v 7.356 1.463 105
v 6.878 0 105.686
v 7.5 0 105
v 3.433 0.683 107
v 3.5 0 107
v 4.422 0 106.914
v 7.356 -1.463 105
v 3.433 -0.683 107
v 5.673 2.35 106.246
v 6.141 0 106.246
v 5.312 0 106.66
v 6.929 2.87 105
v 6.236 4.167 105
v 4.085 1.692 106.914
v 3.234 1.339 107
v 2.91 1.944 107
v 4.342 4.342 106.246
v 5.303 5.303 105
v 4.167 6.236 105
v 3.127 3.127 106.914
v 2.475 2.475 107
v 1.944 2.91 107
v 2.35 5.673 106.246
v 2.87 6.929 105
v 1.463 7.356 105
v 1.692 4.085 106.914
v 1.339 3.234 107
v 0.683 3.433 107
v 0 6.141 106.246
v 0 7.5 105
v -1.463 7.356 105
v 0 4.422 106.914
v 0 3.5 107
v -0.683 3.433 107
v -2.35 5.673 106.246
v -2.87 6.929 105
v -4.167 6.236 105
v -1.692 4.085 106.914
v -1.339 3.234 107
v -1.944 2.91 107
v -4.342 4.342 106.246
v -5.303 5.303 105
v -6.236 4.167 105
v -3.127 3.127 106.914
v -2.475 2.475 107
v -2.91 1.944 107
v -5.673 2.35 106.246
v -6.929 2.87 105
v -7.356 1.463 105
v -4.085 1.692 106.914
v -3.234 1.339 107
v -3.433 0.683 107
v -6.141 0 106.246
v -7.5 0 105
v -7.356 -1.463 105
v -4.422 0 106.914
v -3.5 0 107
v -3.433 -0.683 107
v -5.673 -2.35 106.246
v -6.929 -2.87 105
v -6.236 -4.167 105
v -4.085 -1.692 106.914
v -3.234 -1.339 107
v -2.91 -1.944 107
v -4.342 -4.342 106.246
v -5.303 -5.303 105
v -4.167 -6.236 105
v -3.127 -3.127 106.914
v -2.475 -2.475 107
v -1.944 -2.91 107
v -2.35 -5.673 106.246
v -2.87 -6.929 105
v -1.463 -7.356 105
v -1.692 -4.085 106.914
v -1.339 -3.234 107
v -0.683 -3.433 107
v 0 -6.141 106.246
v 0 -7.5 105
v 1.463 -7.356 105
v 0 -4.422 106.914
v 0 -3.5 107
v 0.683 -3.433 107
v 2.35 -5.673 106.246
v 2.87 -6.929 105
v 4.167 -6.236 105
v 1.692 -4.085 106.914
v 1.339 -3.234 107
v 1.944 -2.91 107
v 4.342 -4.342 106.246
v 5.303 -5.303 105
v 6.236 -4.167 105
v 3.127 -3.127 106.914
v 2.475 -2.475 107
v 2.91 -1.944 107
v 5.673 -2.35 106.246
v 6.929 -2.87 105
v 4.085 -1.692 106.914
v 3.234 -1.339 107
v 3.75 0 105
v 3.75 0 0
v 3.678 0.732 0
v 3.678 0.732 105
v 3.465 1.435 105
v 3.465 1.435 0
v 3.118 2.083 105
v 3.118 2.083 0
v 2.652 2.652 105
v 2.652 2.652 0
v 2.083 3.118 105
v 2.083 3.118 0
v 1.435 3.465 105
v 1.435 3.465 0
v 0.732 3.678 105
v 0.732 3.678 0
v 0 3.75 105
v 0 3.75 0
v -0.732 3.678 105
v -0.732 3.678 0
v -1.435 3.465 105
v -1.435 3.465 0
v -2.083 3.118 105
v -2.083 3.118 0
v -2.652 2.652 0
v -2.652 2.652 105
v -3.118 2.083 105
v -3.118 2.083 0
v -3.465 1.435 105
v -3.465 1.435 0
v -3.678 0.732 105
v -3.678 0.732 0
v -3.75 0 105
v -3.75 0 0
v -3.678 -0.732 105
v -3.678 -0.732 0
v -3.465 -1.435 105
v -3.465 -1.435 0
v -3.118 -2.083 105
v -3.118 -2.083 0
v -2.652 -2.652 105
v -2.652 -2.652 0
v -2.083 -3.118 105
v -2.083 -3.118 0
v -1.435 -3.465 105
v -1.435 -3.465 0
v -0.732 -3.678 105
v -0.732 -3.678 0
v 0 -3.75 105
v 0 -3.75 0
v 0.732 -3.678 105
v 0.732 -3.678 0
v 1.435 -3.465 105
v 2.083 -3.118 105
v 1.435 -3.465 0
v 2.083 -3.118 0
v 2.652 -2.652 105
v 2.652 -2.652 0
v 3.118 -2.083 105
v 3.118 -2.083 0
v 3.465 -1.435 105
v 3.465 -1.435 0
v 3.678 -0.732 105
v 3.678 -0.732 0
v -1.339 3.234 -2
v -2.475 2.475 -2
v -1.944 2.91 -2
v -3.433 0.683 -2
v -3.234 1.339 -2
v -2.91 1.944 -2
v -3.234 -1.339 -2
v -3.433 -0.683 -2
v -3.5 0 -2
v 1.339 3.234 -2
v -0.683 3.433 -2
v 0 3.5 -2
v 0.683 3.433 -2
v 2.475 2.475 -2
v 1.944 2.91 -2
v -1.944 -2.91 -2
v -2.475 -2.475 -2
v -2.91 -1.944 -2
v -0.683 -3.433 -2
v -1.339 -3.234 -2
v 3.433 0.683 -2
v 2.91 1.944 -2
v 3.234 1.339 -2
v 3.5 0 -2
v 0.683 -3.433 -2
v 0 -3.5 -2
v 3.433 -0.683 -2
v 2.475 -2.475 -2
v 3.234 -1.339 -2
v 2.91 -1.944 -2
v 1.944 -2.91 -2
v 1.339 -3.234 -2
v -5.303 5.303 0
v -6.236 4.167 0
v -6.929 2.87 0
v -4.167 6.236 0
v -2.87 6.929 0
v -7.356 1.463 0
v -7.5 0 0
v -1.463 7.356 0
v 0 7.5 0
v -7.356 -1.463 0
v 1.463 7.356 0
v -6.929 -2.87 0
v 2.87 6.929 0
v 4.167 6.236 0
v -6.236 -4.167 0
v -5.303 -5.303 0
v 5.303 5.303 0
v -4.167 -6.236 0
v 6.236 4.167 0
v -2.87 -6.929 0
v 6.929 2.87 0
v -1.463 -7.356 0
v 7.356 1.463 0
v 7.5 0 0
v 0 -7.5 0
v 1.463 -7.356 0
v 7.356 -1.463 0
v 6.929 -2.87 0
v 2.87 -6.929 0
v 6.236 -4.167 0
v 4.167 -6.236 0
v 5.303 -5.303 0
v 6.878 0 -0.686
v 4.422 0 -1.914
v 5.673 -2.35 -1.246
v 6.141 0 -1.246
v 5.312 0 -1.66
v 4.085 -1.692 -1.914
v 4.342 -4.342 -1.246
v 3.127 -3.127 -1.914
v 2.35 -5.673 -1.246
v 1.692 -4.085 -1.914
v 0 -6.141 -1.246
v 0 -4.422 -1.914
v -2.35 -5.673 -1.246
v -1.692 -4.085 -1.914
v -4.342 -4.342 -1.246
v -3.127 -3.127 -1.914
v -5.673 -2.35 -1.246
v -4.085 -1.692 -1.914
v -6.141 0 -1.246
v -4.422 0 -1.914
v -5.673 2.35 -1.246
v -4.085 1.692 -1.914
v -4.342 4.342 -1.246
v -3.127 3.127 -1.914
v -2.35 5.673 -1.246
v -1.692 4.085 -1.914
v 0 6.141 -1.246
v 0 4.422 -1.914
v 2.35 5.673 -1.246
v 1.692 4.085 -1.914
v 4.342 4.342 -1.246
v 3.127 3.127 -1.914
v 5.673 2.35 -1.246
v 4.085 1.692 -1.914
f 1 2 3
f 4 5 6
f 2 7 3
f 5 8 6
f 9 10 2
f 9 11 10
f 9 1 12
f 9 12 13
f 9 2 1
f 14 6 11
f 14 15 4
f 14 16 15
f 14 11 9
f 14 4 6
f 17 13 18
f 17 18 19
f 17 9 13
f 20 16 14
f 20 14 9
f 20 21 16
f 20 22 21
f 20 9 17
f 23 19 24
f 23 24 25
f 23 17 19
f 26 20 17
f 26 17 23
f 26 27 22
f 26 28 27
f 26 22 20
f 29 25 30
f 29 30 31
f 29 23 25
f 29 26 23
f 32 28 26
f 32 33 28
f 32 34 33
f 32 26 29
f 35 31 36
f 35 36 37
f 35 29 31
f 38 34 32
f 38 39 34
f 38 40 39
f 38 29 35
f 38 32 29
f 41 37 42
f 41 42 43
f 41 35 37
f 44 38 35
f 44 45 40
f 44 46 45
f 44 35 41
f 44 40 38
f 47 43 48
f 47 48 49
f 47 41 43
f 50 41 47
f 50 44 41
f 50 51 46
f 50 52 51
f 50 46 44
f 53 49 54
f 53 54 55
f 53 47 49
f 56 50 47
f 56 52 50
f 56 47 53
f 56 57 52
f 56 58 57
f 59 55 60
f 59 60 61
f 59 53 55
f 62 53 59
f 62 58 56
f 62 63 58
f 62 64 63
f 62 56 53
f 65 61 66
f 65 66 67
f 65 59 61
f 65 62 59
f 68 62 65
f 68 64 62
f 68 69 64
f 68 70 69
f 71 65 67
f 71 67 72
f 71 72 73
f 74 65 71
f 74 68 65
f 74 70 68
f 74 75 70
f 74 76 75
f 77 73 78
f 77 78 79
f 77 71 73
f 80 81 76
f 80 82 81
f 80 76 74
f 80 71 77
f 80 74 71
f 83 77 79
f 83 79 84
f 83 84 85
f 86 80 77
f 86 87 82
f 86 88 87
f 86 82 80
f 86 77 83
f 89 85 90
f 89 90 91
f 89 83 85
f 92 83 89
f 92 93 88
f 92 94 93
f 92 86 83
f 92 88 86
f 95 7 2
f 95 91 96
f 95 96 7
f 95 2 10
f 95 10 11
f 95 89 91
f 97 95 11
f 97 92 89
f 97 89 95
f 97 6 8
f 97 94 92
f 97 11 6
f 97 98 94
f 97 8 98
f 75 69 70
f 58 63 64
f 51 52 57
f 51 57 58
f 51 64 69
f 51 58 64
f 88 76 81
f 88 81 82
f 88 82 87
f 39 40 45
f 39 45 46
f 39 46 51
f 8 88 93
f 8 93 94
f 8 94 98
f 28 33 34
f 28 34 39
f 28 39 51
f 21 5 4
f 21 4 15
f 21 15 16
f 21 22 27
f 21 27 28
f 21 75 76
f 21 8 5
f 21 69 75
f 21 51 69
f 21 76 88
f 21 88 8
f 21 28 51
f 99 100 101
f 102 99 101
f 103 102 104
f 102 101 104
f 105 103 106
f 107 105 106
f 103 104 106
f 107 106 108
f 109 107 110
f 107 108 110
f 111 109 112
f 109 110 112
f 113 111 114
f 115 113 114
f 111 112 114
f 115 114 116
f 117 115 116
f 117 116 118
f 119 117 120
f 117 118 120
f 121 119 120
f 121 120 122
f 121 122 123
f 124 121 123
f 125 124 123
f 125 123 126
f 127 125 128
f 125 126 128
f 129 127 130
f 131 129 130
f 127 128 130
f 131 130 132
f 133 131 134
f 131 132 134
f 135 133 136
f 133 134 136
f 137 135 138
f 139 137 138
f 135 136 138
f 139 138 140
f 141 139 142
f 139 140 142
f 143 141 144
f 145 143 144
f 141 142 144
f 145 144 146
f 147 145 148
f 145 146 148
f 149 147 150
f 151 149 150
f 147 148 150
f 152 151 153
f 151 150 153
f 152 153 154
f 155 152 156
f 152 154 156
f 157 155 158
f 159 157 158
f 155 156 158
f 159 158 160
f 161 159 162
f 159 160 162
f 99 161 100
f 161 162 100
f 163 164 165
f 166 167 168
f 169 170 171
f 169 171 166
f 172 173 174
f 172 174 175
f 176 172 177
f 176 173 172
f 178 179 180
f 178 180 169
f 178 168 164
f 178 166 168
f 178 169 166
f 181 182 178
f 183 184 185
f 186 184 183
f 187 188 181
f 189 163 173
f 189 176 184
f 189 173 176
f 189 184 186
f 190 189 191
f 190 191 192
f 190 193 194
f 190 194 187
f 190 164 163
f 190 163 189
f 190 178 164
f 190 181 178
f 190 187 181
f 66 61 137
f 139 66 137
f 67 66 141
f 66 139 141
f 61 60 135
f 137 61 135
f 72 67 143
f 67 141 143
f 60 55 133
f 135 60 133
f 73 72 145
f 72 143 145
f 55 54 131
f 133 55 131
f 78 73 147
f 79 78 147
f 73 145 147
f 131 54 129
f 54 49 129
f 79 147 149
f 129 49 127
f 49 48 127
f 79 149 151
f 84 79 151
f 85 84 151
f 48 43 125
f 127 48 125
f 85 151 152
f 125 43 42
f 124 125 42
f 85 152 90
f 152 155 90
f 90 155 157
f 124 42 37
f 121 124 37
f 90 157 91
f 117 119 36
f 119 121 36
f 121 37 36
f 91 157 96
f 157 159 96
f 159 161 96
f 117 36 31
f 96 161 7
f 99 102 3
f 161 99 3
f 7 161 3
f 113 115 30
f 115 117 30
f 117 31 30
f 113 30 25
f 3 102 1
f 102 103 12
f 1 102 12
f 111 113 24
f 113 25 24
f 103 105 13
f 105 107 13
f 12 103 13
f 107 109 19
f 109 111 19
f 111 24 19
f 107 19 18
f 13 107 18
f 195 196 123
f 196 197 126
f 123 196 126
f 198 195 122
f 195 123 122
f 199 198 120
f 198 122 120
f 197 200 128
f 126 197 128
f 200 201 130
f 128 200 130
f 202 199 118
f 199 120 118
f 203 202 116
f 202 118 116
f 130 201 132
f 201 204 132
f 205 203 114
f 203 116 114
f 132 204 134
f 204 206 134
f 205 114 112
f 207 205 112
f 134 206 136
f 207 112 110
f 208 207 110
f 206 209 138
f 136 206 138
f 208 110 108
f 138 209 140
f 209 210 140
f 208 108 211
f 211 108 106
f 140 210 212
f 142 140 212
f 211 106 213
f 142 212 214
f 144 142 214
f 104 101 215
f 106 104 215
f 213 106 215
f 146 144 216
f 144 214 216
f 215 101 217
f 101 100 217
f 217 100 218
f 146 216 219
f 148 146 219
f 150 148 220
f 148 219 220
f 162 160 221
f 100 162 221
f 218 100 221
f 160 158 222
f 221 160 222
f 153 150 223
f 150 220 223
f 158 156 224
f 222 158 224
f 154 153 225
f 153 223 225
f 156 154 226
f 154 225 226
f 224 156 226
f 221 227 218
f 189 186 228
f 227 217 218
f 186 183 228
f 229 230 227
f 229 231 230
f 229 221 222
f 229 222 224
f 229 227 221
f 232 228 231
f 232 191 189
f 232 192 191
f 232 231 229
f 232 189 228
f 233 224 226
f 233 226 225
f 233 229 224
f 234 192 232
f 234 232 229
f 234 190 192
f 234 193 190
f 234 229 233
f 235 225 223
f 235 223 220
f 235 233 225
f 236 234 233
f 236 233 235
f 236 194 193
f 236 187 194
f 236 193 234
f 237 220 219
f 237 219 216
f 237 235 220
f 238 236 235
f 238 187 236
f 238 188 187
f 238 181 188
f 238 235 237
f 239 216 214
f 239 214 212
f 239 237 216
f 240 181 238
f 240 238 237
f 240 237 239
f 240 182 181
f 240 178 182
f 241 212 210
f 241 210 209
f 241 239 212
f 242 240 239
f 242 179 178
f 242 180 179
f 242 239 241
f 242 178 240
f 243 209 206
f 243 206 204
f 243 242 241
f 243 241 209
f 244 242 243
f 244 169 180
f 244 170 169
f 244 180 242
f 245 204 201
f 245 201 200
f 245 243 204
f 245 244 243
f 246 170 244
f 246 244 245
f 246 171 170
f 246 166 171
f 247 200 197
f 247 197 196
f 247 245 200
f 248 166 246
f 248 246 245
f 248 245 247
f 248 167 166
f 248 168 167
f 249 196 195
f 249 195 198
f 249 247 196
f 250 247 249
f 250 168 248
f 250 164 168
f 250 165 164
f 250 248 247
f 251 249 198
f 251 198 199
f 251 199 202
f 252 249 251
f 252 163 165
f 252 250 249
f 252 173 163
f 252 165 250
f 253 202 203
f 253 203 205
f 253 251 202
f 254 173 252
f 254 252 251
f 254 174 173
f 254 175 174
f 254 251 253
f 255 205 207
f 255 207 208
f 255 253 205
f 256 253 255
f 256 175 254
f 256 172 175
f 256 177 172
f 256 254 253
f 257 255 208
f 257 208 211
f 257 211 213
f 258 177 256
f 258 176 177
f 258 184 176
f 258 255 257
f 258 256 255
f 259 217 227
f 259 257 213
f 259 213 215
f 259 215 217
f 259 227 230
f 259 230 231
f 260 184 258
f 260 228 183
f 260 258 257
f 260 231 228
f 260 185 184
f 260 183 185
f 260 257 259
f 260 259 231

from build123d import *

# Parameters (mm, degrees)
SKETCH1_R           = 3.75
BOSS_EXTRUDE1_DEPTH = 105
SKETCH3_R           = 7.5
BOSS_EXTRUDE2_DEPTH = 2
BOSS_EXTRUDE3_START = 2
SKETCH4_R           = 7.5
BOSS_EXTRUDE3_DEPTH = 2
FILLET1_R           = 5


with BuildPart() as part:
    # Sketch1 → Boss-Extrude1 (new body)
    with BuildSketch(Plane.XY):
        Circle(SKETCH1_R)
    extrude(amount=BOSS_EXTRUDE1_DEPTH)

    # Sketch3 → Boss-Extrude2 (add)
    with BuildSketch(Plane.XY.offset(105)):
        Circle(SKETCH3_R)
    extrude(amount=BOSS_EXTRUDE2_DEPTH)

    # Sketch4 → Boss-Extrude3 (add)
    with BuildSketch(Plane(origin=(0, 0, 0), x_dir=(-1, 0, 0), z_dir=(0, 0, -1)).offset(BOSS_EXTRUDE3_START)):
        with Locations(Location((0, 0, 0), (0, 0, 180))):
            Circle(SKETCH4_R)
    extrude(amount=-BOSS_EXTRUDE3_DEPTH)

    # Fillet1
    # the kernel refuses this fillet: 5 mm, written as the material it takes off along each edge
    with BuildSketch(Plane(origin=(0, 0, -2), x_dir=(1, 0, 0), z_dir=(0, 1, 0))) as fillet1_piece_1:
        with BuildLine():
            CenterArc((3.5, -5), FILLET1_R, 36.869897646, 53.130102354)
            Line((3.5, 0), (3.5, 0.1))
            Line((3.5, 0.1), (7.5, 0.1))
            Line((7.5, 0.1), (7.6, 0))
            ThreePointArc((7.6, 0), (7.6, -1), (7.58, -1.94))
            Line((7.58, -1.94), (7.5, -2))
        make_face()
    revolve(axis=Axis((0, 0, -2), (0, 0, -1)), mode=Mode.SUBTRACT)
    with BuildSketch(Plane(origin=(0, 0, 107), x_dir=(1, 0, 0), z_dir=(0, -1, 0))) as fillet1_piece_2:
        with BuildLine():
            CenterArc((3.5, -5), FILLET1_R, 36.869897646, 53.130102354)
            Line((3.5, 0), (3.5, 0.1))
            Line((3.5, 0.1), (7.5, 0.1))
            Line((7.5, 0.1), (7.6, 0))
            ThreePointArc((7.6, 0), (7.6, -1), (7.58, -1.94))
            Line((7.58, -1.94), (7.5, -2))
        make_face()
    revolve(axis=Axis((0, 0, 107), (0, 0, 1)), mode=Mode.SUBTRACT)


solid = part.part
